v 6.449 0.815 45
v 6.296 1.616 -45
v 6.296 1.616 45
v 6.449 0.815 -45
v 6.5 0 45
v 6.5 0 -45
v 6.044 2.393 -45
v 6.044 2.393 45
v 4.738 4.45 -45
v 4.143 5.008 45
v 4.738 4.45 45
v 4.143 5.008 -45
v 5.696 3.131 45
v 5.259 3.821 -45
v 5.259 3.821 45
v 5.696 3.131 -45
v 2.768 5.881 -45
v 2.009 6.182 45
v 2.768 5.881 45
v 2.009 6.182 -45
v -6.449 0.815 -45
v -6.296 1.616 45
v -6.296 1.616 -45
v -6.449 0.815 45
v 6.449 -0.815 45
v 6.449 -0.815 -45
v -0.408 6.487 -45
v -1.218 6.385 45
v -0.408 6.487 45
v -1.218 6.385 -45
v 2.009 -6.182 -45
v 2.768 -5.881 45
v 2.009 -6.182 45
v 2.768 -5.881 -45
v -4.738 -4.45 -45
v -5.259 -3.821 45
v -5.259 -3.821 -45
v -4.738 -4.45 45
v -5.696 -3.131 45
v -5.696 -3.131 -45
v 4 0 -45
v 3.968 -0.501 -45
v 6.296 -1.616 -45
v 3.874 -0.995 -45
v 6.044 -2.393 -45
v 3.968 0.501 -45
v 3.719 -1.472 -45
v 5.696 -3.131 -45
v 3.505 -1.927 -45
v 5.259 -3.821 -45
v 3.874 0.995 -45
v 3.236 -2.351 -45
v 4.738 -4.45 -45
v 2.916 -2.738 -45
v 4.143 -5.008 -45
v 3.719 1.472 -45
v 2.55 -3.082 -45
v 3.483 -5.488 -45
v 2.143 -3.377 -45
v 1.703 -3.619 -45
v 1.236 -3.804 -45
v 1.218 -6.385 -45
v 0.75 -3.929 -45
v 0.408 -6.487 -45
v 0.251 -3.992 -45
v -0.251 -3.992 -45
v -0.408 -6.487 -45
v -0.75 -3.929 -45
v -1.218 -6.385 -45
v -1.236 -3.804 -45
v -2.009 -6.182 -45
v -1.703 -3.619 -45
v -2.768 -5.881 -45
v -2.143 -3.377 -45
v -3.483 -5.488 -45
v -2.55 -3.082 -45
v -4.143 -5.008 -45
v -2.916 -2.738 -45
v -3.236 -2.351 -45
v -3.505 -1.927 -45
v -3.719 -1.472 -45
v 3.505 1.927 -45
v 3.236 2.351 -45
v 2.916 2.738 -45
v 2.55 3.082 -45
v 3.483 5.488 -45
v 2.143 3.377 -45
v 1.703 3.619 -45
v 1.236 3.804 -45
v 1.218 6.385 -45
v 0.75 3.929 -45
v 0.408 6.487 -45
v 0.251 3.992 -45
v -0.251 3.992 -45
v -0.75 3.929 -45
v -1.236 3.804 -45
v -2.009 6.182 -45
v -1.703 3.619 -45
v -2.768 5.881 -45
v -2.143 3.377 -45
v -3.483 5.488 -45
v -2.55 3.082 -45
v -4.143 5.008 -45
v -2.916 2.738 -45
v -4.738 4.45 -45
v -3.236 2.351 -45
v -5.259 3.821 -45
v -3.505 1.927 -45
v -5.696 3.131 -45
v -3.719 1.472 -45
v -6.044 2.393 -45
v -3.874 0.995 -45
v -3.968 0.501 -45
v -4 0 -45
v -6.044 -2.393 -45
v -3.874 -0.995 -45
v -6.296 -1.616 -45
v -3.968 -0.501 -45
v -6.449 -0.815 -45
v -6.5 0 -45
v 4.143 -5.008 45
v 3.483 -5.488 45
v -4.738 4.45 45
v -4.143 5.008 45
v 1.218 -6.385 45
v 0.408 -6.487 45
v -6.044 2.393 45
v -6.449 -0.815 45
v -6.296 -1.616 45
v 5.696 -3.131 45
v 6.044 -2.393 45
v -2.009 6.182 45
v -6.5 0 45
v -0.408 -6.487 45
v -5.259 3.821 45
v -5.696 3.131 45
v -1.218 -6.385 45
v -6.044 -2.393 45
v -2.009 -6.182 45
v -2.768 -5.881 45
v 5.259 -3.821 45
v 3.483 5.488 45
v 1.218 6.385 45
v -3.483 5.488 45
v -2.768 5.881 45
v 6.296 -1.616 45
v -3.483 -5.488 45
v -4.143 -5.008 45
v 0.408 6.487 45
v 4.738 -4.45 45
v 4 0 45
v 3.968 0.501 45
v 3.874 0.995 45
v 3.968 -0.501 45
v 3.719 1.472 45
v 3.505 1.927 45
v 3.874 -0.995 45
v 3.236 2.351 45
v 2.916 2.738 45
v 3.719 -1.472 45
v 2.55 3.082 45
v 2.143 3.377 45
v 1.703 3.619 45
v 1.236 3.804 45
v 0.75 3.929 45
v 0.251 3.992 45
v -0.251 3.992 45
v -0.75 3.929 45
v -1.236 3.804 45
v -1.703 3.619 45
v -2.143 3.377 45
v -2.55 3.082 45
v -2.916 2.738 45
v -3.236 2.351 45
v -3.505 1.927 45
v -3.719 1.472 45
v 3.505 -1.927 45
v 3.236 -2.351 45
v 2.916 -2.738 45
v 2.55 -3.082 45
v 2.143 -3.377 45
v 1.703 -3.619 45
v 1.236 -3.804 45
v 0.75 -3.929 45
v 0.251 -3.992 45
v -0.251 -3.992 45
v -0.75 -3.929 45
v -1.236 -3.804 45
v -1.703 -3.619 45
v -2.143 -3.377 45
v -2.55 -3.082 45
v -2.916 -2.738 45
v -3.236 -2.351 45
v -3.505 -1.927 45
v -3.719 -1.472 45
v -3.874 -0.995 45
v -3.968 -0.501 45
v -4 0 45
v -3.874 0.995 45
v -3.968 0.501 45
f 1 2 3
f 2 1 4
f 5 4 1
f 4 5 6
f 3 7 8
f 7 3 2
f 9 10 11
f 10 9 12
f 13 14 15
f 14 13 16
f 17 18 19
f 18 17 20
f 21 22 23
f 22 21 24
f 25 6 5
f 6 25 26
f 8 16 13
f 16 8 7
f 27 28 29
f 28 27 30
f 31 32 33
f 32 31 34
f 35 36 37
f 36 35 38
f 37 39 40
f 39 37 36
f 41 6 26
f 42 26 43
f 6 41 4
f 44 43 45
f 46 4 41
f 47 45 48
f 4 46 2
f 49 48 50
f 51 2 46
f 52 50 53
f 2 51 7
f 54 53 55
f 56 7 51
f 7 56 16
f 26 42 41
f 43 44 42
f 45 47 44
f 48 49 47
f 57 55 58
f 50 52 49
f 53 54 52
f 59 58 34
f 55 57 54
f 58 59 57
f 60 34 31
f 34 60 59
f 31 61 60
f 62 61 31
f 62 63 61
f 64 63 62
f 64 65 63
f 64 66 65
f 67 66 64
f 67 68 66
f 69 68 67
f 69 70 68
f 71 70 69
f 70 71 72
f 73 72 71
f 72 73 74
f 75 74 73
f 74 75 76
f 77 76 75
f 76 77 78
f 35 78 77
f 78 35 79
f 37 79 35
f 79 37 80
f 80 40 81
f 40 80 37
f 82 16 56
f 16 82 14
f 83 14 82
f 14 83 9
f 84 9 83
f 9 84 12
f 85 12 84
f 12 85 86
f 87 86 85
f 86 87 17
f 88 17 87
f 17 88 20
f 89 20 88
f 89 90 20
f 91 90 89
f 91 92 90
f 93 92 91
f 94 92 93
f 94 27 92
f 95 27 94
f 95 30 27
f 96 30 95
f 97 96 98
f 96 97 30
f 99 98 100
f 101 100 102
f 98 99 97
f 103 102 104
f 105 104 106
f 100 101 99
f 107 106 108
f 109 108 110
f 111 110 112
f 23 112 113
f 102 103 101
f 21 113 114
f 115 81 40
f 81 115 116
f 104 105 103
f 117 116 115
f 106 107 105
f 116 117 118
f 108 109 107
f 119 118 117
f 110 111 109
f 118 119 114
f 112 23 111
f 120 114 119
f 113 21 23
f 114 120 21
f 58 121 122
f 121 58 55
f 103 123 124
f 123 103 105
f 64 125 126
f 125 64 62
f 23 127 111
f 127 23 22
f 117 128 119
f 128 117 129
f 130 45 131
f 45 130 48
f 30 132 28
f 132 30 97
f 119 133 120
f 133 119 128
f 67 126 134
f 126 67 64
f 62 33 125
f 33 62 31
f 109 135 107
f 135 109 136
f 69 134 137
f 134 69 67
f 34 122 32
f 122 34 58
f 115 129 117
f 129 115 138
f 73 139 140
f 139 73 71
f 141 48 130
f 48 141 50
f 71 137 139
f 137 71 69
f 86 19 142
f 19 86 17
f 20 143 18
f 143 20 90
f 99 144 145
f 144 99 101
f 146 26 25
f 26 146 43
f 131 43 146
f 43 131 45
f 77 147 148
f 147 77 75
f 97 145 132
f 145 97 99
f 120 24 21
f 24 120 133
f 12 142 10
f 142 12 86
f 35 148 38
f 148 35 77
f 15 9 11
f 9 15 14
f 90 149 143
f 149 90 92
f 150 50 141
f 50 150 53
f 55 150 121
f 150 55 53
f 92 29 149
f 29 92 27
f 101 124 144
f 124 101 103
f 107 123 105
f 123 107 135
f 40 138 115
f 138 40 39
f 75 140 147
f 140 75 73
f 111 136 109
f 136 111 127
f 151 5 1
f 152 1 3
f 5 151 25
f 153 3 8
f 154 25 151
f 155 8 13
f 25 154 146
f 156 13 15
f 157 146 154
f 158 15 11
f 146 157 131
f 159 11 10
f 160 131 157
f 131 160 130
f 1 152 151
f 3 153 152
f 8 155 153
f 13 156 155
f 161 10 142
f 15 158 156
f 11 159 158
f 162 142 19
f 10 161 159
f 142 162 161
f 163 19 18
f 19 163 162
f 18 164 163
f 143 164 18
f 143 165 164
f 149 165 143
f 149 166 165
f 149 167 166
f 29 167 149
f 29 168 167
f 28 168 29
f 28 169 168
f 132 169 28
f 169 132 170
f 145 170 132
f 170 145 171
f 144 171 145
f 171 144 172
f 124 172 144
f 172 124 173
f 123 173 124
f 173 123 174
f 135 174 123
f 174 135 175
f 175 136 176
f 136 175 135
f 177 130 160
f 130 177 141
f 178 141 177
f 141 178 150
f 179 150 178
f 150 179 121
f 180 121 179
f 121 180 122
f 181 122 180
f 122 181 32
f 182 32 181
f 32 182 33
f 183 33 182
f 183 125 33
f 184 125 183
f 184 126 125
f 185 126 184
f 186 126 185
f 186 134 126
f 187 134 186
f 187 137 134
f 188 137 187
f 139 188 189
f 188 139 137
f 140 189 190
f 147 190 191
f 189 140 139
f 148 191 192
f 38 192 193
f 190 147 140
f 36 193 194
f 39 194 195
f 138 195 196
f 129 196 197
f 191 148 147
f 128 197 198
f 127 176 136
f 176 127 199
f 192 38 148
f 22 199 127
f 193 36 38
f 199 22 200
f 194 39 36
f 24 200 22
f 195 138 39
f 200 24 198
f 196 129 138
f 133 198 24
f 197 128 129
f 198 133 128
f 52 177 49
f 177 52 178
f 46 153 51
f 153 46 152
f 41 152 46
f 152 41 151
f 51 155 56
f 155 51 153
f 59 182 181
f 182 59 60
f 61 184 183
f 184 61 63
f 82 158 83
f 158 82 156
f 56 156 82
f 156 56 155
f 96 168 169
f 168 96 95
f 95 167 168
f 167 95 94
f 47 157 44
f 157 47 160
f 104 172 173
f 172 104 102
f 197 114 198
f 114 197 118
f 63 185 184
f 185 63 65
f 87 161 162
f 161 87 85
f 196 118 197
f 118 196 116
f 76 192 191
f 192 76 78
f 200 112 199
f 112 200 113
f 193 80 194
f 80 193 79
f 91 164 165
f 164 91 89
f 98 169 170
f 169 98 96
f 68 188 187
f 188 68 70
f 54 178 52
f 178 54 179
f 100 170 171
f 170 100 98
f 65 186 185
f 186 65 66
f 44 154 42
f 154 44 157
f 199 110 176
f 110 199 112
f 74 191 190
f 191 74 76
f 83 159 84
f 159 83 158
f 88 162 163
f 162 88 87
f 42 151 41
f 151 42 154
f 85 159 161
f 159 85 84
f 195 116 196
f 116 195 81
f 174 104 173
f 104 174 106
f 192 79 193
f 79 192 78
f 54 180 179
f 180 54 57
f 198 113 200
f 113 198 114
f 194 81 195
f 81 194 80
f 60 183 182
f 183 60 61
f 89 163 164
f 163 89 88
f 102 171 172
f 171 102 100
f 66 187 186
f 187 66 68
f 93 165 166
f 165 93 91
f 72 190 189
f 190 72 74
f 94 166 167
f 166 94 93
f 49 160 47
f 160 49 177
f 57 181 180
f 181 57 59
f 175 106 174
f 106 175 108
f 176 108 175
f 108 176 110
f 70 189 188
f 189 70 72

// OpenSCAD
$fn = 50;


difference() {
	union() {
		translate(v = [0, 0, -45.0000000000]) {
			cylinder(h = 90, r = 6.5000000000);
		}
	}
	union() {
		translate(v = [0, 0, -100.0000000000]) {
			cylinder(h = 200, r = 4.0000000000);
		}
	}
}
